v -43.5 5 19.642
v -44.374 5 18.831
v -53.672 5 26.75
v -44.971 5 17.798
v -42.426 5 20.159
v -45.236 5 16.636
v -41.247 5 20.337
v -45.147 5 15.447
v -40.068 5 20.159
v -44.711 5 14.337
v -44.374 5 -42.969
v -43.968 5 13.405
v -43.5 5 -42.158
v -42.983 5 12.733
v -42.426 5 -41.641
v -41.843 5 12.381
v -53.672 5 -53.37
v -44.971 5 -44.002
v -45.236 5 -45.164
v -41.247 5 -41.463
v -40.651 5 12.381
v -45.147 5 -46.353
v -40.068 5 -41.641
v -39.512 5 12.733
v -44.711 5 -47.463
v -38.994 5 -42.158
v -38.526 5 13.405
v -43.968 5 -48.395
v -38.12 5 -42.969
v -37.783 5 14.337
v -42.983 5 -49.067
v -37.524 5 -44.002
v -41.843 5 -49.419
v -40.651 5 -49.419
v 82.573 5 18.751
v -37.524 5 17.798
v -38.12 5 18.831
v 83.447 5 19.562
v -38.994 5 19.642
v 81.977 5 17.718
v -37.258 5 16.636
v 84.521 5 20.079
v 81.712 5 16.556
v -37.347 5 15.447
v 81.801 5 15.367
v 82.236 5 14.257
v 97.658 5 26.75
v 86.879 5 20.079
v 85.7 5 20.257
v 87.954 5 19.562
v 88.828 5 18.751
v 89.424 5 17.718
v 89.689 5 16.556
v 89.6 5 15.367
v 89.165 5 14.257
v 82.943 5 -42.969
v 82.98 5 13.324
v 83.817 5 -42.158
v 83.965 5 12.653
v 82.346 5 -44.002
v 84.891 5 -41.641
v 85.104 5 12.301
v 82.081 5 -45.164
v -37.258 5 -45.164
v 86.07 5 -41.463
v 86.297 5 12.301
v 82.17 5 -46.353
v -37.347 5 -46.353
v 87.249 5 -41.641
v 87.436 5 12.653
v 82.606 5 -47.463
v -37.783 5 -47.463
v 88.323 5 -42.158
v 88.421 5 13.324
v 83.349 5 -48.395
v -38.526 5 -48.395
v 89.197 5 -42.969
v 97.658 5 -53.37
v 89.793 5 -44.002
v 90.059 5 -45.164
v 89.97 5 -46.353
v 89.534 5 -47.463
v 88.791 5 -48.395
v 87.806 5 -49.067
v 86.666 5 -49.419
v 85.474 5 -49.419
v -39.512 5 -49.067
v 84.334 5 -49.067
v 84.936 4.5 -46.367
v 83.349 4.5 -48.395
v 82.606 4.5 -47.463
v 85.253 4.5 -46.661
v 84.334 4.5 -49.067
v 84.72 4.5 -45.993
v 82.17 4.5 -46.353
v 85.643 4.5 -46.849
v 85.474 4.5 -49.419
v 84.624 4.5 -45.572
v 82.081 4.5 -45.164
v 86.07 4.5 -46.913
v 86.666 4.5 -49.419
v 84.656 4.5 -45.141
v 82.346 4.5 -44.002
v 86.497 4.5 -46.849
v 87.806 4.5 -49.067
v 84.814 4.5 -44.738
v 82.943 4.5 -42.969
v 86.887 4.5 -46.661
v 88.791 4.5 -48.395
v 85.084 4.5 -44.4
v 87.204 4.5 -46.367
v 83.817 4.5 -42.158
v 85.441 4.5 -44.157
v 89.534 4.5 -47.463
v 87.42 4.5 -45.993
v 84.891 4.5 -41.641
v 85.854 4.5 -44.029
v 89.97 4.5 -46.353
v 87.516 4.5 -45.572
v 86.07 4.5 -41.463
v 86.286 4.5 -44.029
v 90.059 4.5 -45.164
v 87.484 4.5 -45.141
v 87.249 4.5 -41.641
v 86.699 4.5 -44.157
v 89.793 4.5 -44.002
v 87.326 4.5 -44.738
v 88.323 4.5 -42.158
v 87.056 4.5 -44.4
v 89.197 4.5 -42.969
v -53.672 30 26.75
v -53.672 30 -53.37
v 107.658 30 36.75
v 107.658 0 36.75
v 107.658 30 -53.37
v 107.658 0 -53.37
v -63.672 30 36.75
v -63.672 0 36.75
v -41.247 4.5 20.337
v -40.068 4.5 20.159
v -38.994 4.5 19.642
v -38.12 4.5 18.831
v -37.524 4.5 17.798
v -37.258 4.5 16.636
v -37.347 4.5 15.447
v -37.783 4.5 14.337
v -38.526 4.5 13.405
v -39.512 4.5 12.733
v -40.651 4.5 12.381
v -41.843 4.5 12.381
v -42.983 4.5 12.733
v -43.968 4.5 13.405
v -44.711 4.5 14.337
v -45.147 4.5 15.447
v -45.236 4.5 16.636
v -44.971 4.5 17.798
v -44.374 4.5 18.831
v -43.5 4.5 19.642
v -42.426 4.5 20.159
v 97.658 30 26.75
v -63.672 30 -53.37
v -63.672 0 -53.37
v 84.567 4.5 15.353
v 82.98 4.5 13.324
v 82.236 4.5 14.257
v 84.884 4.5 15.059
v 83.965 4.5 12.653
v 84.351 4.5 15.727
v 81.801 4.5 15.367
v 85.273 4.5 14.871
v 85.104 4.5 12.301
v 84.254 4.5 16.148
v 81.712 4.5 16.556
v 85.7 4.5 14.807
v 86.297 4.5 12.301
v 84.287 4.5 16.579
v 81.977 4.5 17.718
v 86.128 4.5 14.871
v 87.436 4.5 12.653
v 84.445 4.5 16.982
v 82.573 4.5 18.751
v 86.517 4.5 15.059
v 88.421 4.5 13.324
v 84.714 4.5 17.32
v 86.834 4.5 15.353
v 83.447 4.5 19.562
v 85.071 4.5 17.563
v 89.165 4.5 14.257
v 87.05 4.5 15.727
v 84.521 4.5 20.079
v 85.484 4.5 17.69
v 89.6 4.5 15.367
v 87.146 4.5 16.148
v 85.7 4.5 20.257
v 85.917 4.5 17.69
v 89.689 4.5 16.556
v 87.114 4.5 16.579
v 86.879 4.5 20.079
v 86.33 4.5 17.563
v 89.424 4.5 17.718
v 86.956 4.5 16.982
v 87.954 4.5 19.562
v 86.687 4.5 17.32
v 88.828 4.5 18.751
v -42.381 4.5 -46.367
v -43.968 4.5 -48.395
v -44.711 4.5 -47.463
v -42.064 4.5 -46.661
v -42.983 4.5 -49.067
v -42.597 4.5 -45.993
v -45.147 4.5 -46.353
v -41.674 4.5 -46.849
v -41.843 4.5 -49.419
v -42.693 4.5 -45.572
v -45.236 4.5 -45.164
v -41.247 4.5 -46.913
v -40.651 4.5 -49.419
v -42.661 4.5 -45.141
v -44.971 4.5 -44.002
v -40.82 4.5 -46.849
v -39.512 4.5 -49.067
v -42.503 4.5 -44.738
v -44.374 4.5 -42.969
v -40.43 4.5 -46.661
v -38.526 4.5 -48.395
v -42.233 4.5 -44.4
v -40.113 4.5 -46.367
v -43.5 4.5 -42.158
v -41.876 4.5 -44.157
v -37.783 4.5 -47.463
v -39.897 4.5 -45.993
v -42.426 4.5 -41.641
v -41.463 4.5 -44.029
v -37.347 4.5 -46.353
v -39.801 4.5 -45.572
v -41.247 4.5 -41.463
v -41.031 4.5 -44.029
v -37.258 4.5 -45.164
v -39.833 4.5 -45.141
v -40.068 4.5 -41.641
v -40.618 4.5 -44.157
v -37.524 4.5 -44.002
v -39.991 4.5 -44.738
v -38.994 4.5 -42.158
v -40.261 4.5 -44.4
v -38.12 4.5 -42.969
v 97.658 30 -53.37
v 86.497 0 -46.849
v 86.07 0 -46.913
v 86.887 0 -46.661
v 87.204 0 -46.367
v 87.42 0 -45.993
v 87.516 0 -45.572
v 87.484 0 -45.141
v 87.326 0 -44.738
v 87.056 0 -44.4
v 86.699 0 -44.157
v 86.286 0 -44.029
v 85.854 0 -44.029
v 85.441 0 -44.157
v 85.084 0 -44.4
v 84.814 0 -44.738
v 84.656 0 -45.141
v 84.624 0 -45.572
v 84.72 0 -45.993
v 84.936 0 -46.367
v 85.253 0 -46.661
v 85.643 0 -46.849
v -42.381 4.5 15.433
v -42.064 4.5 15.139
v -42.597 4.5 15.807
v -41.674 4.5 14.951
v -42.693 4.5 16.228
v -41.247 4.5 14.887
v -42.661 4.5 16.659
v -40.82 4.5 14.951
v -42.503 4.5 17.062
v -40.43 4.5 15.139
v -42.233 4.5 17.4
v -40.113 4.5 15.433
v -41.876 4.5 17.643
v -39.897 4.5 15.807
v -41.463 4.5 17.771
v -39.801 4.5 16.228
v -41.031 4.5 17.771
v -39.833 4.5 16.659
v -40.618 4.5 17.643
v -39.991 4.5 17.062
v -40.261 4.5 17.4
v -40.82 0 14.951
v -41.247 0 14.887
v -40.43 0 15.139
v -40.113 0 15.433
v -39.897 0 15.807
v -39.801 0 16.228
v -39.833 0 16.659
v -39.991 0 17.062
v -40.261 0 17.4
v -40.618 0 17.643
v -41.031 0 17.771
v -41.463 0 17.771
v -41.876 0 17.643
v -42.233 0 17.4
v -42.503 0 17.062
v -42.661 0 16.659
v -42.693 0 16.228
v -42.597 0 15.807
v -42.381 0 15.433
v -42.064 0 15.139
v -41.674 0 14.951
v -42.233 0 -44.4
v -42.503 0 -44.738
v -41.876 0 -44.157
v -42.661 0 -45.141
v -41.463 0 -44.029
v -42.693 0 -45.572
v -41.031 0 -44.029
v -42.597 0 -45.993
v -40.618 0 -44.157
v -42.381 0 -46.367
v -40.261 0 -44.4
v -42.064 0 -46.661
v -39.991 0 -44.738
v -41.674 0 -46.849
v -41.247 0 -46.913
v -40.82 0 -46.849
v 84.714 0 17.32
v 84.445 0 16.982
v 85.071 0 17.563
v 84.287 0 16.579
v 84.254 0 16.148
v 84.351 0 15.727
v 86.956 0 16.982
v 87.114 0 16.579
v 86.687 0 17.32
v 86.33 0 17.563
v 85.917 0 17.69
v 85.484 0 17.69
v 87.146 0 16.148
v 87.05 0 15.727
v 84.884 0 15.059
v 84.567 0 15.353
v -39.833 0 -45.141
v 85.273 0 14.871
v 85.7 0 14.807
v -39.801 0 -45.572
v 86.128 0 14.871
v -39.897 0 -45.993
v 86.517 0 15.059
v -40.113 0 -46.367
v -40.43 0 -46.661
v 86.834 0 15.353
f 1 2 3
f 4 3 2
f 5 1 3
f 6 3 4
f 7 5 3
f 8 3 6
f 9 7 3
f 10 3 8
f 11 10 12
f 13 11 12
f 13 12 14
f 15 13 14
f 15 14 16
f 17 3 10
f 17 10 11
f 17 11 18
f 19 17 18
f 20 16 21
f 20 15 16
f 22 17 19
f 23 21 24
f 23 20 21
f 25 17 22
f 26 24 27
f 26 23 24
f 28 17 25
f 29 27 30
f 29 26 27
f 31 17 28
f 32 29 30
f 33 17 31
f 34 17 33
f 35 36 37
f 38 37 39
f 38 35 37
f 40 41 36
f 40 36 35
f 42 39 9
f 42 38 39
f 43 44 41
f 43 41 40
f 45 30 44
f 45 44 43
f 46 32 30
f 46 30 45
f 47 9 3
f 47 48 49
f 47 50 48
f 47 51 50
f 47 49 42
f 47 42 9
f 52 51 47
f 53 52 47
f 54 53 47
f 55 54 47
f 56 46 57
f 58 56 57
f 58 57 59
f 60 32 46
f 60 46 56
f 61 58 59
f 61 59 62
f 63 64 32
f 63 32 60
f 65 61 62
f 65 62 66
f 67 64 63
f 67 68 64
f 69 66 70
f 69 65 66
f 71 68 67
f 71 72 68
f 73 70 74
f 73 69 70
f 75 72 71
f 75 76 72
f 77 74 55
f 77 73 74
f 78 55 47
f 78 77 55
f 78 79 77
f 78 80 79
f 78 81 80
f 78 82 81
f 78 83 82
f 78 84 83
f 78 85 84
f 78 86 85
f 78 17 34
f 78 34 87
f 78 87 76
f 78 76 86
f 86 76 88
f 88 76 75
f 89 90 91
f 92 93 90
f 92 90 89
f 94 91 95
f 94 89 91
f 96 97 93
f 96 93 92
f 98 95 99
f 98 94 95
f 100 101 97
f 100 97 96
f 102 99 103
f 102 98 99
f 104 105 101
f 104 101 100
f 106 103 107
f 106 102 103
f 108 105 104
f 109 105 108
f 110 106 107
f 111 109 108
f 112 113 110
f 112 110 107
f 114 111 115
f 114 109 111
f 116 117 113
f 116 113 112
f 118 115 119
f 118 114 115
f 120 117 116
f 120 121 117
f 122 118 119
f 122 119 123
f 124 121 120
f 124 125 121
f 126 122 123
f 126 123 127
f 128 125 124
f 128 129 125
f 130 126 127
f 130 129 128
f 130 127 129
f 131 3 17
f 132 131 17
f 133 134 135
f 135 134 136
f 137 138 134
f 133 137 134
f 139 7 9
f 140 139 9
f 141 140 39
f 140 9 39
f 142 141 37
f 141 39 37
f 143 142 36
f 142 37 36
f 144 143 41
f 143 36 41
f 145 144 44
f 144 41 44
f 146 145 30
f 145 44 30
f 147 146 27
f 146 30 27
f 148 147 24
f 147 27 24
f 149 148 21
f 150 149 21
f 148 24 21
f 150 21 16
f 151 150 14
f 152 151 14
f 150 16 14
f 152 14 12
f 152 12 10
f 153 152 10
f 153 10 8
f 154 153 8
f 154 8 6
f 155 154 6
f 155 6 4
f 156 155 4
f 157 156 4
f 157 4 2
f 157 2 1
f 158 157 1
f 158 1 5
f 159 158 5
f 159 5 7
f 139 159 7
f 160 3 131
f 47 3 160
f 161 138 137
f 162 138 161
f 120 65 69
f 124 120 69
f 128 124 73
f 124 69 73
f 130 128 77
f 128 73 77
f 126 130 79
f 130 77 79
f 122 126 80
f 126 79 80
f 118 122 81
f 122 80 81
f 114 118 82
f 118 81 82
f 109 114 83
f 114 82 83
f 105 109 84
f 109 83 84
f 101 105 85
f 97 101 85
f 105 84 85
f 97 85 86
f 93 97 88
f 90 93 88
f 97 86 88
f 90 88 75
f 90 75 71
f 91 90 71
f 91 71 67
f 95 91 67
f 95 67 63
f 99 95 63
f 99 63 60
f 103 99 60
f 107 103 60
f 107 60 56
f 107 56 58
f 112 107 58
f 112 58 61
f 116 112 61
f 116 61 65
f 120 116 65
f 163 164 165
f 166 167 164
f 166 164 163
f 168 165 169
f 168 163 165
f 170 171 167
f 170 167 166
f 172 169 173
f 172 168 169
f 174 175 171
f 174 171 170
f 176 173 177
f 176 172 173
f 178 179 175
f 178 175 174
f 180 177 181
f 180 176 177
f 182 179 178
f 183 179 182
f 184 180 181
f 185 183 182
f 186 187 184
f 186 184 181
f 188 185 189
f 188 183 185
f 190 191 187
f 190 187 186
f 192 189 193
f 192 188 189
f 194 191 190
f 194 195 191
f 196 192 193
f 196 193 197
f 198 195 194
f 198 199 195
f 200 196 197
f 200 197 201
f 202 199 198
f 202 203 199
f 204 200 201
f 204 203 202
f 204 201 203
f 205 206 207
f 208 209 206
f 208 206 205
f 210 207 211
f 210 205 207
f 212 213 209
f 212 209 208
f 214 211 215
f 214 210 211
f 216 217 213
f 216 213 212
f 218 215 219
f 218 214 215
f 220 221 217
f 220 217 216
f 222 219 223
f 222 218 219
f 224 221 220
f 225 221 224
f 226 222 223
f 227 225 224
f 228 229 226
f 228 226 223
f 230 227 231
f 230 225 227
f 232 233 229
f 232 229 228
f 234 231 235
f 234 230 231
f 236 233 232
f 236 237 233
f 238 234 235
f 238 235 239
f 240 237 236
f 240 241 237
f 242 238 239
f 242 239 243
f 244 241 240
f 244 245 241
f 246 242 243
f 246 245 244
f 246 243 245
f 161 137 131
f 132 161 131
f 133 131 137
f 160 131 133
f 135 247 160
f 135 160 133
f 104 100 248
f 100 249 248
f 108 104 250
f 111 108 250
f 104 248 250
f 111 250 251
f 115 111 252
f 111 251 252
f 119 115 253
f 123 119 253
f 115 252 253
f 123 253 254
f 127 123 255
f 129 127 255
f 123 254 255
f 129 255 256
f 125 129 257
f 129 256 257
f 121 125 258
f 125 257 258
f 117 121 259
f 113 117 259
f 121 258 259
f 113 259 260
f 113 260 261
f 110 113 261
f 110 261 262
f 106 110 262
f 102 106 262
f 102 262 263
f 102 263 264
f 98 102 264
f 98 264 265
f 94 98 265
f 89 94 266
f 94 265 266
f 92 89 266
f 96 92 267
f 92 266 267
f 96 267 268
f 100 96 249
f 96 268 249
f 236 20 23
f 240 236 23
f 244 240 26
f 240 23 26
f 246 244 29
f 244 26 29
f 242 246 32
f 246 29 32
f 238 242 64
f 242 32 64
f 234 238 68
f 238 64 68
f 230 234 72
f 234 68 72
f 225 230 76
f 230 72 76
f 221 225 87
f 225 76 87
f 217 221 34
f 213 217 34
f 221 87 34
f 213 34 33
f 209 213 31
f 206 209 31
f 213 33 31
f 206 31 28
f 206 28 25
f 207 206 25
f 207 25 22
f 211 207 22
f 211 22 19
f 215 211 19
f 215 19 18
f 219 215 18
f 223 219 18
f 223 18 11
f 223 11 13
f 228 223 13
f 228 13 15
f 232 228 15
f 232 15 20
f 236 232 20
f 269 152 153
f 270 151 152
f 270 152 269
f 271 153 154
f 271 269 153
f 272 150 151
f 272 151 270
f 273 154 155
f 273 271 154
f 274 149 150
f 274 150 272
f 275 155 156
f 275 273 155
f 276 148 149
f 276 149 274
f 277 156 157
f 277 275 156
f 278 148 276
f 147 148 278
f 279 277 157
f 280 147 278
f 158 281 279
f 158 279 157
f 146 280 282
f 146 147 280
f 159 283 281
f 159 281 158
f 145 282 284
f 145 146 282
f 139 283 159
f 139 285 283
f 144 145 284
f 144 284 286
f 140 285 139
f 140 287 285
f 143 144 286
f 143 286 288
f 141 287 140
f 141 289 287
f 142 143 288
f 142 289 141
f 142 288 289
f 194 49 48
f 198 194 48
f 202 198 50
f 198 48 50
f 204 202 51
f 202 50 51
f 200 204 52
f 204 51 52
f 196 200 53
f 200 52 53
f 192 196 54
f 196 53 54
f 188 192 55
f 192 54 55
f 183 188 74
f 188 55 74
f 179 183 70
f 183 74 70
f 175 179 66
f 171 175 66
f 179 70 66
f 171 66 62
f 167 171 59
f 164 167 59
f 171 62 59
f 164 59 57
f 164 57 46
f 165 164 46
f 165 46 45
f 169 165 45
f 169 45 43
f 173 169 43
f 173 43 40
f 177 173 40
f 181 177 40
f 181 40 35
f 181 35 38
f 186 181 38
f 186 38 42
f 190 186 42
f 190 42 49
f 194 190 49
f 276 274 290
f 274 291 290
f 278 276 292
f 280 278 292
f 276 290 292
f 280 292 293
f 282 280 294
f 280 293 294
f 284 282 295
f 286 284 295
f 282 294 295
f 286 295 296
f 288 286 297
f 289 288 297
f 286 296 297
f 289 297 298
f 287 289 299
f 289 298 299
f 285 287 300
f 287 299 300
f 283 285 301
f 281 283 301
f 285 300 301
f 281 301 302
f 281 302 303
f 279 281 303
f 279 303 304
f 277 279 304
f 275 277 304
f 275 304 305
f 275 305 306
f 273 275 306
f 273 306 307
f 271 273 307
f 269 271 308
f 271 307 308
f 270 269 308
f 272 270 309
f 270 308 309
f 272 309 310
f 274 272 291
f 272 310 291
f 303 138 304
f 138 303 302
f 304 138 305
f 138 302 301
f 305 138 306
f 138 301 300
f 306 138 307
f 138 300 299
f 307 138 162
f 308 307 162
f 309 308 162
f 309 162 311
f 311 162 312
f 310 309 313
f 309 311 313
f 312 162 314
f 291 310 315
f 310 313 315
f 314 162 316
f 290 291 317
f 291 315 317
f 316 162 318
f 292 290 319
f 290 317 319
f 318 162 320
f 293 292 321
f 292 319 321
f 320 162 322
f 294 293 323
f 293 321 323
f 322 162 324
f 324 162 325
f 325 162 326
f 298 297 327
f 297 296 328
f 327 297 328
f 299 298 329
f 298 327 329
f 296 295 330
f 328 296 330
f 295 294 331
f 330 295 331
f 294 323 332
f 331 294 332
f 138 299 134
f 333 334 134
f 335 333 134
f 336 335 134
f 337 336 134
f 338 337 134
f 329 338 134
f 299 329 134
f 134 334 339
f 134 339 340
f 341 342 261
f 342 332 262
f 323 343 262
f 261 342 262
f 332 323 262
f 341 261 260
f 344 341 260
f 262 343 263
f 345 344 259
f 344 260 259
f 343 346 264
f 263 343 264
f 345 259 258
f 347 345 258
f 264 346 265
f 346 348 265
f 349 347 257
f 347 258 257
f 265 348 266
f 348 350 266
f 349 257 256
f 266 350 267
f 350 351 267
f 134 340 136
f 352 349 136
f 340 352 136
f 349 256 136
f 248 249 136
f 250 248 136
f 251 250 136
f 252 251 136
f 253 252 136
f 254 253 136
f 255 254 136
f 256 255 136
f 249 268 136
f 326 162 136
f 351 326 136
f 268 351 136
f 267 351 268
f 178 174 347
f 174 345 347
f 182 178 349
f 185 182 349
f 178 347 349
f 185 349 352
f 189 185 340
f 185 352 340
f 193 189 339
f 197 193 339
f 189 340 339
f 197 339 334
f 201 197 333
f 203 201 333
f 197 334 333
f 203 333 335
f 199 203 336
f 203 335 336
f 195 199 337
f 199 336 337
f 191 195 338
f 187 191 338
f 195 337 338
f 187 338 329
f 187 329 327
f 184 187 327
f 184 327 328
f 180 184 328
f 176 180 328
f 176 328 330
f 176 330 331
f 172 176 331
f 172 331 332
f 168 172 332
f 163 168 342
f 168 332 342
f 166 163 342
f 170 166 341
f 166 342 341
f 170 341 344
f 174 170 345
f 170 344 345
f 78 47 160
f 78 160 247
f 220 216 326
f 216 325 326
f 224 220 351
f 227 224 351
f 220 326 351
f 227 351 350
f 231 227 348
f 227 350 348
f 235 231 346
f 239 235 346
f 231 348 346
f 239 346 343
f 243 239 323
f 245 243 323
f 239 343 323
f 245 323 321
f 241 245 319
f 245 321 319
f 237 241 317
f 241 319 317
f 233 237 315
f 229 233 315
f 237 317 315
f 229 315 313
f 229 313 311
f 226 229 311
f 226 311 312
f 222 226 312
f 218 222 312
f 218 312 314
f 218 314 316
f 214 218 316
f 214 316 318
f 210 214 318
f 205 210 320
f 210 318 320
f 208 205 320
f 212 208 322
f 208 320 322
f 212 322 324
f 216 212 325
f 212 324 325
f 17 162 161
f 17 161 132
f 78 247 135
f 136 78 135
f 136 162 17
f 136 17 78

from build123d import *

# Parameters (mm, degrees)
SKETCH1_W                                            = 151.33
SKETCH1_H                                            = 80.12
BOSS_EXTRUDE1_DEPTH                                  = 5
SKETCH3_W                                            = 10
SKETCH3_H                                            = 90.12
SKETCH3_W_2                                          = 151.33
SKETCH3_H_2                                          = 10
BOSS_EXTRUDE2_DEPTH                                  = 30
CBORE_FOR_M2_5_HEXAGON_HEAD_BOLTS_FULL_T_D           = 2.9
CBORE_FOR_M2_5_HEXAGON_HEAD_BOLTS_FULL_T_DEPTH       = 20
CBORE_FOR_M2_5_HEXAGON_HEAD_BOLTS_FULL_T_CBORE_D     = 8
CBORE_FOR_M2_5_HEXAGON_HEAD_BOLTS_FULL_T_CBORE_DEPTH = 0.5
CBORE_FOR_M2_5_HEXAGON_HEAD_BOLTS_FULL_T_TIP         = 0.871247898


with BuildPart() as part:
    # Sketch1 → Boss-Extrude1 (new body)
    with BuildSketch(Plane(origin=(0, 0, 0), x_dir=(1, 0, 0), z_dir=(0, 1, 0))):
        with Locations((21.993286604, 13.310186916)):
            Rectangle(SKETCH1_W, SKETCH1_H)
    extrude(amount=BOSS_EXTRUDE1_DEPTH)

    # Sketch3 → Boss-Extrude2 (add)
    with BuildSketch(Plane(origin=(0, 0, 0), x_dir=(1, 0, 0), z_dir=(0, 1, 0))):
        with Locations((-58.671713396, 8.310186916)):
            Rectangle(SKETCH3_W, SKETCH3_H)
        with Locations((21.993286604, -31.749813084)):
            Rectangle(SKETCH3_W_2, SKETCH3_H_2)
        with Locations((102.658286604, 8.310186916)):
            Rectangle(SKETCH3_W, SKETCH3_H)
    extrude(amount=BOSS_EXTRUDE2_DEPTH)

    # CBORE for M2.5 Hexagon head bolts-Full thread-grades AB1
    with Locations(Plane(origin=(85.700408956, 5, 16.256611899), x_dir=(0, 0, 1), z_dir=(0, 1, 0))):
        with Locations((0, 0), (0.080180531, -126.947449906), (-61.719848362, -126.947449906), (-61.719848362, 0.369580631)):
            CounterBoreHole(CBORE_FOR_M2_5_HEXAGON_HEAD_BOLTS_FULL_T_D / 2, CBORE_FOR_M2_5_HEXAGON_HEAD_BOLTS_FULL_T_CBORE_D / 2, CBORE_FOR_M2_5_HEXAGON_HEAD_BOLTS_FULL_T_CBORE_DEPTH, depth=CBORE_FOR_M2_5_HEXAGON_HEAD_BOLTS_FULL_T_DEPTH)
            with Locations((0, 0, -(CBORE_FOR_M2_5_HEXAGON_HEAD_BOLTS_FULL_T_DEPTH + CBORE_FOR_M2_5_HEXAGON_HEAD_BOLTS_FULL_T_TIP / 2))):  # 118° drill point
                Cone(0, CBORE_FOR_M2_5_HEXAGON_HEAD_BOLTS_FULL_T_D / 2, CBORE_FOR_M2_5_HEXAGON_HEAD_BOLTS_FULL_T_TIP, mode=Mode.SUBTRACT)


solid = part.part
